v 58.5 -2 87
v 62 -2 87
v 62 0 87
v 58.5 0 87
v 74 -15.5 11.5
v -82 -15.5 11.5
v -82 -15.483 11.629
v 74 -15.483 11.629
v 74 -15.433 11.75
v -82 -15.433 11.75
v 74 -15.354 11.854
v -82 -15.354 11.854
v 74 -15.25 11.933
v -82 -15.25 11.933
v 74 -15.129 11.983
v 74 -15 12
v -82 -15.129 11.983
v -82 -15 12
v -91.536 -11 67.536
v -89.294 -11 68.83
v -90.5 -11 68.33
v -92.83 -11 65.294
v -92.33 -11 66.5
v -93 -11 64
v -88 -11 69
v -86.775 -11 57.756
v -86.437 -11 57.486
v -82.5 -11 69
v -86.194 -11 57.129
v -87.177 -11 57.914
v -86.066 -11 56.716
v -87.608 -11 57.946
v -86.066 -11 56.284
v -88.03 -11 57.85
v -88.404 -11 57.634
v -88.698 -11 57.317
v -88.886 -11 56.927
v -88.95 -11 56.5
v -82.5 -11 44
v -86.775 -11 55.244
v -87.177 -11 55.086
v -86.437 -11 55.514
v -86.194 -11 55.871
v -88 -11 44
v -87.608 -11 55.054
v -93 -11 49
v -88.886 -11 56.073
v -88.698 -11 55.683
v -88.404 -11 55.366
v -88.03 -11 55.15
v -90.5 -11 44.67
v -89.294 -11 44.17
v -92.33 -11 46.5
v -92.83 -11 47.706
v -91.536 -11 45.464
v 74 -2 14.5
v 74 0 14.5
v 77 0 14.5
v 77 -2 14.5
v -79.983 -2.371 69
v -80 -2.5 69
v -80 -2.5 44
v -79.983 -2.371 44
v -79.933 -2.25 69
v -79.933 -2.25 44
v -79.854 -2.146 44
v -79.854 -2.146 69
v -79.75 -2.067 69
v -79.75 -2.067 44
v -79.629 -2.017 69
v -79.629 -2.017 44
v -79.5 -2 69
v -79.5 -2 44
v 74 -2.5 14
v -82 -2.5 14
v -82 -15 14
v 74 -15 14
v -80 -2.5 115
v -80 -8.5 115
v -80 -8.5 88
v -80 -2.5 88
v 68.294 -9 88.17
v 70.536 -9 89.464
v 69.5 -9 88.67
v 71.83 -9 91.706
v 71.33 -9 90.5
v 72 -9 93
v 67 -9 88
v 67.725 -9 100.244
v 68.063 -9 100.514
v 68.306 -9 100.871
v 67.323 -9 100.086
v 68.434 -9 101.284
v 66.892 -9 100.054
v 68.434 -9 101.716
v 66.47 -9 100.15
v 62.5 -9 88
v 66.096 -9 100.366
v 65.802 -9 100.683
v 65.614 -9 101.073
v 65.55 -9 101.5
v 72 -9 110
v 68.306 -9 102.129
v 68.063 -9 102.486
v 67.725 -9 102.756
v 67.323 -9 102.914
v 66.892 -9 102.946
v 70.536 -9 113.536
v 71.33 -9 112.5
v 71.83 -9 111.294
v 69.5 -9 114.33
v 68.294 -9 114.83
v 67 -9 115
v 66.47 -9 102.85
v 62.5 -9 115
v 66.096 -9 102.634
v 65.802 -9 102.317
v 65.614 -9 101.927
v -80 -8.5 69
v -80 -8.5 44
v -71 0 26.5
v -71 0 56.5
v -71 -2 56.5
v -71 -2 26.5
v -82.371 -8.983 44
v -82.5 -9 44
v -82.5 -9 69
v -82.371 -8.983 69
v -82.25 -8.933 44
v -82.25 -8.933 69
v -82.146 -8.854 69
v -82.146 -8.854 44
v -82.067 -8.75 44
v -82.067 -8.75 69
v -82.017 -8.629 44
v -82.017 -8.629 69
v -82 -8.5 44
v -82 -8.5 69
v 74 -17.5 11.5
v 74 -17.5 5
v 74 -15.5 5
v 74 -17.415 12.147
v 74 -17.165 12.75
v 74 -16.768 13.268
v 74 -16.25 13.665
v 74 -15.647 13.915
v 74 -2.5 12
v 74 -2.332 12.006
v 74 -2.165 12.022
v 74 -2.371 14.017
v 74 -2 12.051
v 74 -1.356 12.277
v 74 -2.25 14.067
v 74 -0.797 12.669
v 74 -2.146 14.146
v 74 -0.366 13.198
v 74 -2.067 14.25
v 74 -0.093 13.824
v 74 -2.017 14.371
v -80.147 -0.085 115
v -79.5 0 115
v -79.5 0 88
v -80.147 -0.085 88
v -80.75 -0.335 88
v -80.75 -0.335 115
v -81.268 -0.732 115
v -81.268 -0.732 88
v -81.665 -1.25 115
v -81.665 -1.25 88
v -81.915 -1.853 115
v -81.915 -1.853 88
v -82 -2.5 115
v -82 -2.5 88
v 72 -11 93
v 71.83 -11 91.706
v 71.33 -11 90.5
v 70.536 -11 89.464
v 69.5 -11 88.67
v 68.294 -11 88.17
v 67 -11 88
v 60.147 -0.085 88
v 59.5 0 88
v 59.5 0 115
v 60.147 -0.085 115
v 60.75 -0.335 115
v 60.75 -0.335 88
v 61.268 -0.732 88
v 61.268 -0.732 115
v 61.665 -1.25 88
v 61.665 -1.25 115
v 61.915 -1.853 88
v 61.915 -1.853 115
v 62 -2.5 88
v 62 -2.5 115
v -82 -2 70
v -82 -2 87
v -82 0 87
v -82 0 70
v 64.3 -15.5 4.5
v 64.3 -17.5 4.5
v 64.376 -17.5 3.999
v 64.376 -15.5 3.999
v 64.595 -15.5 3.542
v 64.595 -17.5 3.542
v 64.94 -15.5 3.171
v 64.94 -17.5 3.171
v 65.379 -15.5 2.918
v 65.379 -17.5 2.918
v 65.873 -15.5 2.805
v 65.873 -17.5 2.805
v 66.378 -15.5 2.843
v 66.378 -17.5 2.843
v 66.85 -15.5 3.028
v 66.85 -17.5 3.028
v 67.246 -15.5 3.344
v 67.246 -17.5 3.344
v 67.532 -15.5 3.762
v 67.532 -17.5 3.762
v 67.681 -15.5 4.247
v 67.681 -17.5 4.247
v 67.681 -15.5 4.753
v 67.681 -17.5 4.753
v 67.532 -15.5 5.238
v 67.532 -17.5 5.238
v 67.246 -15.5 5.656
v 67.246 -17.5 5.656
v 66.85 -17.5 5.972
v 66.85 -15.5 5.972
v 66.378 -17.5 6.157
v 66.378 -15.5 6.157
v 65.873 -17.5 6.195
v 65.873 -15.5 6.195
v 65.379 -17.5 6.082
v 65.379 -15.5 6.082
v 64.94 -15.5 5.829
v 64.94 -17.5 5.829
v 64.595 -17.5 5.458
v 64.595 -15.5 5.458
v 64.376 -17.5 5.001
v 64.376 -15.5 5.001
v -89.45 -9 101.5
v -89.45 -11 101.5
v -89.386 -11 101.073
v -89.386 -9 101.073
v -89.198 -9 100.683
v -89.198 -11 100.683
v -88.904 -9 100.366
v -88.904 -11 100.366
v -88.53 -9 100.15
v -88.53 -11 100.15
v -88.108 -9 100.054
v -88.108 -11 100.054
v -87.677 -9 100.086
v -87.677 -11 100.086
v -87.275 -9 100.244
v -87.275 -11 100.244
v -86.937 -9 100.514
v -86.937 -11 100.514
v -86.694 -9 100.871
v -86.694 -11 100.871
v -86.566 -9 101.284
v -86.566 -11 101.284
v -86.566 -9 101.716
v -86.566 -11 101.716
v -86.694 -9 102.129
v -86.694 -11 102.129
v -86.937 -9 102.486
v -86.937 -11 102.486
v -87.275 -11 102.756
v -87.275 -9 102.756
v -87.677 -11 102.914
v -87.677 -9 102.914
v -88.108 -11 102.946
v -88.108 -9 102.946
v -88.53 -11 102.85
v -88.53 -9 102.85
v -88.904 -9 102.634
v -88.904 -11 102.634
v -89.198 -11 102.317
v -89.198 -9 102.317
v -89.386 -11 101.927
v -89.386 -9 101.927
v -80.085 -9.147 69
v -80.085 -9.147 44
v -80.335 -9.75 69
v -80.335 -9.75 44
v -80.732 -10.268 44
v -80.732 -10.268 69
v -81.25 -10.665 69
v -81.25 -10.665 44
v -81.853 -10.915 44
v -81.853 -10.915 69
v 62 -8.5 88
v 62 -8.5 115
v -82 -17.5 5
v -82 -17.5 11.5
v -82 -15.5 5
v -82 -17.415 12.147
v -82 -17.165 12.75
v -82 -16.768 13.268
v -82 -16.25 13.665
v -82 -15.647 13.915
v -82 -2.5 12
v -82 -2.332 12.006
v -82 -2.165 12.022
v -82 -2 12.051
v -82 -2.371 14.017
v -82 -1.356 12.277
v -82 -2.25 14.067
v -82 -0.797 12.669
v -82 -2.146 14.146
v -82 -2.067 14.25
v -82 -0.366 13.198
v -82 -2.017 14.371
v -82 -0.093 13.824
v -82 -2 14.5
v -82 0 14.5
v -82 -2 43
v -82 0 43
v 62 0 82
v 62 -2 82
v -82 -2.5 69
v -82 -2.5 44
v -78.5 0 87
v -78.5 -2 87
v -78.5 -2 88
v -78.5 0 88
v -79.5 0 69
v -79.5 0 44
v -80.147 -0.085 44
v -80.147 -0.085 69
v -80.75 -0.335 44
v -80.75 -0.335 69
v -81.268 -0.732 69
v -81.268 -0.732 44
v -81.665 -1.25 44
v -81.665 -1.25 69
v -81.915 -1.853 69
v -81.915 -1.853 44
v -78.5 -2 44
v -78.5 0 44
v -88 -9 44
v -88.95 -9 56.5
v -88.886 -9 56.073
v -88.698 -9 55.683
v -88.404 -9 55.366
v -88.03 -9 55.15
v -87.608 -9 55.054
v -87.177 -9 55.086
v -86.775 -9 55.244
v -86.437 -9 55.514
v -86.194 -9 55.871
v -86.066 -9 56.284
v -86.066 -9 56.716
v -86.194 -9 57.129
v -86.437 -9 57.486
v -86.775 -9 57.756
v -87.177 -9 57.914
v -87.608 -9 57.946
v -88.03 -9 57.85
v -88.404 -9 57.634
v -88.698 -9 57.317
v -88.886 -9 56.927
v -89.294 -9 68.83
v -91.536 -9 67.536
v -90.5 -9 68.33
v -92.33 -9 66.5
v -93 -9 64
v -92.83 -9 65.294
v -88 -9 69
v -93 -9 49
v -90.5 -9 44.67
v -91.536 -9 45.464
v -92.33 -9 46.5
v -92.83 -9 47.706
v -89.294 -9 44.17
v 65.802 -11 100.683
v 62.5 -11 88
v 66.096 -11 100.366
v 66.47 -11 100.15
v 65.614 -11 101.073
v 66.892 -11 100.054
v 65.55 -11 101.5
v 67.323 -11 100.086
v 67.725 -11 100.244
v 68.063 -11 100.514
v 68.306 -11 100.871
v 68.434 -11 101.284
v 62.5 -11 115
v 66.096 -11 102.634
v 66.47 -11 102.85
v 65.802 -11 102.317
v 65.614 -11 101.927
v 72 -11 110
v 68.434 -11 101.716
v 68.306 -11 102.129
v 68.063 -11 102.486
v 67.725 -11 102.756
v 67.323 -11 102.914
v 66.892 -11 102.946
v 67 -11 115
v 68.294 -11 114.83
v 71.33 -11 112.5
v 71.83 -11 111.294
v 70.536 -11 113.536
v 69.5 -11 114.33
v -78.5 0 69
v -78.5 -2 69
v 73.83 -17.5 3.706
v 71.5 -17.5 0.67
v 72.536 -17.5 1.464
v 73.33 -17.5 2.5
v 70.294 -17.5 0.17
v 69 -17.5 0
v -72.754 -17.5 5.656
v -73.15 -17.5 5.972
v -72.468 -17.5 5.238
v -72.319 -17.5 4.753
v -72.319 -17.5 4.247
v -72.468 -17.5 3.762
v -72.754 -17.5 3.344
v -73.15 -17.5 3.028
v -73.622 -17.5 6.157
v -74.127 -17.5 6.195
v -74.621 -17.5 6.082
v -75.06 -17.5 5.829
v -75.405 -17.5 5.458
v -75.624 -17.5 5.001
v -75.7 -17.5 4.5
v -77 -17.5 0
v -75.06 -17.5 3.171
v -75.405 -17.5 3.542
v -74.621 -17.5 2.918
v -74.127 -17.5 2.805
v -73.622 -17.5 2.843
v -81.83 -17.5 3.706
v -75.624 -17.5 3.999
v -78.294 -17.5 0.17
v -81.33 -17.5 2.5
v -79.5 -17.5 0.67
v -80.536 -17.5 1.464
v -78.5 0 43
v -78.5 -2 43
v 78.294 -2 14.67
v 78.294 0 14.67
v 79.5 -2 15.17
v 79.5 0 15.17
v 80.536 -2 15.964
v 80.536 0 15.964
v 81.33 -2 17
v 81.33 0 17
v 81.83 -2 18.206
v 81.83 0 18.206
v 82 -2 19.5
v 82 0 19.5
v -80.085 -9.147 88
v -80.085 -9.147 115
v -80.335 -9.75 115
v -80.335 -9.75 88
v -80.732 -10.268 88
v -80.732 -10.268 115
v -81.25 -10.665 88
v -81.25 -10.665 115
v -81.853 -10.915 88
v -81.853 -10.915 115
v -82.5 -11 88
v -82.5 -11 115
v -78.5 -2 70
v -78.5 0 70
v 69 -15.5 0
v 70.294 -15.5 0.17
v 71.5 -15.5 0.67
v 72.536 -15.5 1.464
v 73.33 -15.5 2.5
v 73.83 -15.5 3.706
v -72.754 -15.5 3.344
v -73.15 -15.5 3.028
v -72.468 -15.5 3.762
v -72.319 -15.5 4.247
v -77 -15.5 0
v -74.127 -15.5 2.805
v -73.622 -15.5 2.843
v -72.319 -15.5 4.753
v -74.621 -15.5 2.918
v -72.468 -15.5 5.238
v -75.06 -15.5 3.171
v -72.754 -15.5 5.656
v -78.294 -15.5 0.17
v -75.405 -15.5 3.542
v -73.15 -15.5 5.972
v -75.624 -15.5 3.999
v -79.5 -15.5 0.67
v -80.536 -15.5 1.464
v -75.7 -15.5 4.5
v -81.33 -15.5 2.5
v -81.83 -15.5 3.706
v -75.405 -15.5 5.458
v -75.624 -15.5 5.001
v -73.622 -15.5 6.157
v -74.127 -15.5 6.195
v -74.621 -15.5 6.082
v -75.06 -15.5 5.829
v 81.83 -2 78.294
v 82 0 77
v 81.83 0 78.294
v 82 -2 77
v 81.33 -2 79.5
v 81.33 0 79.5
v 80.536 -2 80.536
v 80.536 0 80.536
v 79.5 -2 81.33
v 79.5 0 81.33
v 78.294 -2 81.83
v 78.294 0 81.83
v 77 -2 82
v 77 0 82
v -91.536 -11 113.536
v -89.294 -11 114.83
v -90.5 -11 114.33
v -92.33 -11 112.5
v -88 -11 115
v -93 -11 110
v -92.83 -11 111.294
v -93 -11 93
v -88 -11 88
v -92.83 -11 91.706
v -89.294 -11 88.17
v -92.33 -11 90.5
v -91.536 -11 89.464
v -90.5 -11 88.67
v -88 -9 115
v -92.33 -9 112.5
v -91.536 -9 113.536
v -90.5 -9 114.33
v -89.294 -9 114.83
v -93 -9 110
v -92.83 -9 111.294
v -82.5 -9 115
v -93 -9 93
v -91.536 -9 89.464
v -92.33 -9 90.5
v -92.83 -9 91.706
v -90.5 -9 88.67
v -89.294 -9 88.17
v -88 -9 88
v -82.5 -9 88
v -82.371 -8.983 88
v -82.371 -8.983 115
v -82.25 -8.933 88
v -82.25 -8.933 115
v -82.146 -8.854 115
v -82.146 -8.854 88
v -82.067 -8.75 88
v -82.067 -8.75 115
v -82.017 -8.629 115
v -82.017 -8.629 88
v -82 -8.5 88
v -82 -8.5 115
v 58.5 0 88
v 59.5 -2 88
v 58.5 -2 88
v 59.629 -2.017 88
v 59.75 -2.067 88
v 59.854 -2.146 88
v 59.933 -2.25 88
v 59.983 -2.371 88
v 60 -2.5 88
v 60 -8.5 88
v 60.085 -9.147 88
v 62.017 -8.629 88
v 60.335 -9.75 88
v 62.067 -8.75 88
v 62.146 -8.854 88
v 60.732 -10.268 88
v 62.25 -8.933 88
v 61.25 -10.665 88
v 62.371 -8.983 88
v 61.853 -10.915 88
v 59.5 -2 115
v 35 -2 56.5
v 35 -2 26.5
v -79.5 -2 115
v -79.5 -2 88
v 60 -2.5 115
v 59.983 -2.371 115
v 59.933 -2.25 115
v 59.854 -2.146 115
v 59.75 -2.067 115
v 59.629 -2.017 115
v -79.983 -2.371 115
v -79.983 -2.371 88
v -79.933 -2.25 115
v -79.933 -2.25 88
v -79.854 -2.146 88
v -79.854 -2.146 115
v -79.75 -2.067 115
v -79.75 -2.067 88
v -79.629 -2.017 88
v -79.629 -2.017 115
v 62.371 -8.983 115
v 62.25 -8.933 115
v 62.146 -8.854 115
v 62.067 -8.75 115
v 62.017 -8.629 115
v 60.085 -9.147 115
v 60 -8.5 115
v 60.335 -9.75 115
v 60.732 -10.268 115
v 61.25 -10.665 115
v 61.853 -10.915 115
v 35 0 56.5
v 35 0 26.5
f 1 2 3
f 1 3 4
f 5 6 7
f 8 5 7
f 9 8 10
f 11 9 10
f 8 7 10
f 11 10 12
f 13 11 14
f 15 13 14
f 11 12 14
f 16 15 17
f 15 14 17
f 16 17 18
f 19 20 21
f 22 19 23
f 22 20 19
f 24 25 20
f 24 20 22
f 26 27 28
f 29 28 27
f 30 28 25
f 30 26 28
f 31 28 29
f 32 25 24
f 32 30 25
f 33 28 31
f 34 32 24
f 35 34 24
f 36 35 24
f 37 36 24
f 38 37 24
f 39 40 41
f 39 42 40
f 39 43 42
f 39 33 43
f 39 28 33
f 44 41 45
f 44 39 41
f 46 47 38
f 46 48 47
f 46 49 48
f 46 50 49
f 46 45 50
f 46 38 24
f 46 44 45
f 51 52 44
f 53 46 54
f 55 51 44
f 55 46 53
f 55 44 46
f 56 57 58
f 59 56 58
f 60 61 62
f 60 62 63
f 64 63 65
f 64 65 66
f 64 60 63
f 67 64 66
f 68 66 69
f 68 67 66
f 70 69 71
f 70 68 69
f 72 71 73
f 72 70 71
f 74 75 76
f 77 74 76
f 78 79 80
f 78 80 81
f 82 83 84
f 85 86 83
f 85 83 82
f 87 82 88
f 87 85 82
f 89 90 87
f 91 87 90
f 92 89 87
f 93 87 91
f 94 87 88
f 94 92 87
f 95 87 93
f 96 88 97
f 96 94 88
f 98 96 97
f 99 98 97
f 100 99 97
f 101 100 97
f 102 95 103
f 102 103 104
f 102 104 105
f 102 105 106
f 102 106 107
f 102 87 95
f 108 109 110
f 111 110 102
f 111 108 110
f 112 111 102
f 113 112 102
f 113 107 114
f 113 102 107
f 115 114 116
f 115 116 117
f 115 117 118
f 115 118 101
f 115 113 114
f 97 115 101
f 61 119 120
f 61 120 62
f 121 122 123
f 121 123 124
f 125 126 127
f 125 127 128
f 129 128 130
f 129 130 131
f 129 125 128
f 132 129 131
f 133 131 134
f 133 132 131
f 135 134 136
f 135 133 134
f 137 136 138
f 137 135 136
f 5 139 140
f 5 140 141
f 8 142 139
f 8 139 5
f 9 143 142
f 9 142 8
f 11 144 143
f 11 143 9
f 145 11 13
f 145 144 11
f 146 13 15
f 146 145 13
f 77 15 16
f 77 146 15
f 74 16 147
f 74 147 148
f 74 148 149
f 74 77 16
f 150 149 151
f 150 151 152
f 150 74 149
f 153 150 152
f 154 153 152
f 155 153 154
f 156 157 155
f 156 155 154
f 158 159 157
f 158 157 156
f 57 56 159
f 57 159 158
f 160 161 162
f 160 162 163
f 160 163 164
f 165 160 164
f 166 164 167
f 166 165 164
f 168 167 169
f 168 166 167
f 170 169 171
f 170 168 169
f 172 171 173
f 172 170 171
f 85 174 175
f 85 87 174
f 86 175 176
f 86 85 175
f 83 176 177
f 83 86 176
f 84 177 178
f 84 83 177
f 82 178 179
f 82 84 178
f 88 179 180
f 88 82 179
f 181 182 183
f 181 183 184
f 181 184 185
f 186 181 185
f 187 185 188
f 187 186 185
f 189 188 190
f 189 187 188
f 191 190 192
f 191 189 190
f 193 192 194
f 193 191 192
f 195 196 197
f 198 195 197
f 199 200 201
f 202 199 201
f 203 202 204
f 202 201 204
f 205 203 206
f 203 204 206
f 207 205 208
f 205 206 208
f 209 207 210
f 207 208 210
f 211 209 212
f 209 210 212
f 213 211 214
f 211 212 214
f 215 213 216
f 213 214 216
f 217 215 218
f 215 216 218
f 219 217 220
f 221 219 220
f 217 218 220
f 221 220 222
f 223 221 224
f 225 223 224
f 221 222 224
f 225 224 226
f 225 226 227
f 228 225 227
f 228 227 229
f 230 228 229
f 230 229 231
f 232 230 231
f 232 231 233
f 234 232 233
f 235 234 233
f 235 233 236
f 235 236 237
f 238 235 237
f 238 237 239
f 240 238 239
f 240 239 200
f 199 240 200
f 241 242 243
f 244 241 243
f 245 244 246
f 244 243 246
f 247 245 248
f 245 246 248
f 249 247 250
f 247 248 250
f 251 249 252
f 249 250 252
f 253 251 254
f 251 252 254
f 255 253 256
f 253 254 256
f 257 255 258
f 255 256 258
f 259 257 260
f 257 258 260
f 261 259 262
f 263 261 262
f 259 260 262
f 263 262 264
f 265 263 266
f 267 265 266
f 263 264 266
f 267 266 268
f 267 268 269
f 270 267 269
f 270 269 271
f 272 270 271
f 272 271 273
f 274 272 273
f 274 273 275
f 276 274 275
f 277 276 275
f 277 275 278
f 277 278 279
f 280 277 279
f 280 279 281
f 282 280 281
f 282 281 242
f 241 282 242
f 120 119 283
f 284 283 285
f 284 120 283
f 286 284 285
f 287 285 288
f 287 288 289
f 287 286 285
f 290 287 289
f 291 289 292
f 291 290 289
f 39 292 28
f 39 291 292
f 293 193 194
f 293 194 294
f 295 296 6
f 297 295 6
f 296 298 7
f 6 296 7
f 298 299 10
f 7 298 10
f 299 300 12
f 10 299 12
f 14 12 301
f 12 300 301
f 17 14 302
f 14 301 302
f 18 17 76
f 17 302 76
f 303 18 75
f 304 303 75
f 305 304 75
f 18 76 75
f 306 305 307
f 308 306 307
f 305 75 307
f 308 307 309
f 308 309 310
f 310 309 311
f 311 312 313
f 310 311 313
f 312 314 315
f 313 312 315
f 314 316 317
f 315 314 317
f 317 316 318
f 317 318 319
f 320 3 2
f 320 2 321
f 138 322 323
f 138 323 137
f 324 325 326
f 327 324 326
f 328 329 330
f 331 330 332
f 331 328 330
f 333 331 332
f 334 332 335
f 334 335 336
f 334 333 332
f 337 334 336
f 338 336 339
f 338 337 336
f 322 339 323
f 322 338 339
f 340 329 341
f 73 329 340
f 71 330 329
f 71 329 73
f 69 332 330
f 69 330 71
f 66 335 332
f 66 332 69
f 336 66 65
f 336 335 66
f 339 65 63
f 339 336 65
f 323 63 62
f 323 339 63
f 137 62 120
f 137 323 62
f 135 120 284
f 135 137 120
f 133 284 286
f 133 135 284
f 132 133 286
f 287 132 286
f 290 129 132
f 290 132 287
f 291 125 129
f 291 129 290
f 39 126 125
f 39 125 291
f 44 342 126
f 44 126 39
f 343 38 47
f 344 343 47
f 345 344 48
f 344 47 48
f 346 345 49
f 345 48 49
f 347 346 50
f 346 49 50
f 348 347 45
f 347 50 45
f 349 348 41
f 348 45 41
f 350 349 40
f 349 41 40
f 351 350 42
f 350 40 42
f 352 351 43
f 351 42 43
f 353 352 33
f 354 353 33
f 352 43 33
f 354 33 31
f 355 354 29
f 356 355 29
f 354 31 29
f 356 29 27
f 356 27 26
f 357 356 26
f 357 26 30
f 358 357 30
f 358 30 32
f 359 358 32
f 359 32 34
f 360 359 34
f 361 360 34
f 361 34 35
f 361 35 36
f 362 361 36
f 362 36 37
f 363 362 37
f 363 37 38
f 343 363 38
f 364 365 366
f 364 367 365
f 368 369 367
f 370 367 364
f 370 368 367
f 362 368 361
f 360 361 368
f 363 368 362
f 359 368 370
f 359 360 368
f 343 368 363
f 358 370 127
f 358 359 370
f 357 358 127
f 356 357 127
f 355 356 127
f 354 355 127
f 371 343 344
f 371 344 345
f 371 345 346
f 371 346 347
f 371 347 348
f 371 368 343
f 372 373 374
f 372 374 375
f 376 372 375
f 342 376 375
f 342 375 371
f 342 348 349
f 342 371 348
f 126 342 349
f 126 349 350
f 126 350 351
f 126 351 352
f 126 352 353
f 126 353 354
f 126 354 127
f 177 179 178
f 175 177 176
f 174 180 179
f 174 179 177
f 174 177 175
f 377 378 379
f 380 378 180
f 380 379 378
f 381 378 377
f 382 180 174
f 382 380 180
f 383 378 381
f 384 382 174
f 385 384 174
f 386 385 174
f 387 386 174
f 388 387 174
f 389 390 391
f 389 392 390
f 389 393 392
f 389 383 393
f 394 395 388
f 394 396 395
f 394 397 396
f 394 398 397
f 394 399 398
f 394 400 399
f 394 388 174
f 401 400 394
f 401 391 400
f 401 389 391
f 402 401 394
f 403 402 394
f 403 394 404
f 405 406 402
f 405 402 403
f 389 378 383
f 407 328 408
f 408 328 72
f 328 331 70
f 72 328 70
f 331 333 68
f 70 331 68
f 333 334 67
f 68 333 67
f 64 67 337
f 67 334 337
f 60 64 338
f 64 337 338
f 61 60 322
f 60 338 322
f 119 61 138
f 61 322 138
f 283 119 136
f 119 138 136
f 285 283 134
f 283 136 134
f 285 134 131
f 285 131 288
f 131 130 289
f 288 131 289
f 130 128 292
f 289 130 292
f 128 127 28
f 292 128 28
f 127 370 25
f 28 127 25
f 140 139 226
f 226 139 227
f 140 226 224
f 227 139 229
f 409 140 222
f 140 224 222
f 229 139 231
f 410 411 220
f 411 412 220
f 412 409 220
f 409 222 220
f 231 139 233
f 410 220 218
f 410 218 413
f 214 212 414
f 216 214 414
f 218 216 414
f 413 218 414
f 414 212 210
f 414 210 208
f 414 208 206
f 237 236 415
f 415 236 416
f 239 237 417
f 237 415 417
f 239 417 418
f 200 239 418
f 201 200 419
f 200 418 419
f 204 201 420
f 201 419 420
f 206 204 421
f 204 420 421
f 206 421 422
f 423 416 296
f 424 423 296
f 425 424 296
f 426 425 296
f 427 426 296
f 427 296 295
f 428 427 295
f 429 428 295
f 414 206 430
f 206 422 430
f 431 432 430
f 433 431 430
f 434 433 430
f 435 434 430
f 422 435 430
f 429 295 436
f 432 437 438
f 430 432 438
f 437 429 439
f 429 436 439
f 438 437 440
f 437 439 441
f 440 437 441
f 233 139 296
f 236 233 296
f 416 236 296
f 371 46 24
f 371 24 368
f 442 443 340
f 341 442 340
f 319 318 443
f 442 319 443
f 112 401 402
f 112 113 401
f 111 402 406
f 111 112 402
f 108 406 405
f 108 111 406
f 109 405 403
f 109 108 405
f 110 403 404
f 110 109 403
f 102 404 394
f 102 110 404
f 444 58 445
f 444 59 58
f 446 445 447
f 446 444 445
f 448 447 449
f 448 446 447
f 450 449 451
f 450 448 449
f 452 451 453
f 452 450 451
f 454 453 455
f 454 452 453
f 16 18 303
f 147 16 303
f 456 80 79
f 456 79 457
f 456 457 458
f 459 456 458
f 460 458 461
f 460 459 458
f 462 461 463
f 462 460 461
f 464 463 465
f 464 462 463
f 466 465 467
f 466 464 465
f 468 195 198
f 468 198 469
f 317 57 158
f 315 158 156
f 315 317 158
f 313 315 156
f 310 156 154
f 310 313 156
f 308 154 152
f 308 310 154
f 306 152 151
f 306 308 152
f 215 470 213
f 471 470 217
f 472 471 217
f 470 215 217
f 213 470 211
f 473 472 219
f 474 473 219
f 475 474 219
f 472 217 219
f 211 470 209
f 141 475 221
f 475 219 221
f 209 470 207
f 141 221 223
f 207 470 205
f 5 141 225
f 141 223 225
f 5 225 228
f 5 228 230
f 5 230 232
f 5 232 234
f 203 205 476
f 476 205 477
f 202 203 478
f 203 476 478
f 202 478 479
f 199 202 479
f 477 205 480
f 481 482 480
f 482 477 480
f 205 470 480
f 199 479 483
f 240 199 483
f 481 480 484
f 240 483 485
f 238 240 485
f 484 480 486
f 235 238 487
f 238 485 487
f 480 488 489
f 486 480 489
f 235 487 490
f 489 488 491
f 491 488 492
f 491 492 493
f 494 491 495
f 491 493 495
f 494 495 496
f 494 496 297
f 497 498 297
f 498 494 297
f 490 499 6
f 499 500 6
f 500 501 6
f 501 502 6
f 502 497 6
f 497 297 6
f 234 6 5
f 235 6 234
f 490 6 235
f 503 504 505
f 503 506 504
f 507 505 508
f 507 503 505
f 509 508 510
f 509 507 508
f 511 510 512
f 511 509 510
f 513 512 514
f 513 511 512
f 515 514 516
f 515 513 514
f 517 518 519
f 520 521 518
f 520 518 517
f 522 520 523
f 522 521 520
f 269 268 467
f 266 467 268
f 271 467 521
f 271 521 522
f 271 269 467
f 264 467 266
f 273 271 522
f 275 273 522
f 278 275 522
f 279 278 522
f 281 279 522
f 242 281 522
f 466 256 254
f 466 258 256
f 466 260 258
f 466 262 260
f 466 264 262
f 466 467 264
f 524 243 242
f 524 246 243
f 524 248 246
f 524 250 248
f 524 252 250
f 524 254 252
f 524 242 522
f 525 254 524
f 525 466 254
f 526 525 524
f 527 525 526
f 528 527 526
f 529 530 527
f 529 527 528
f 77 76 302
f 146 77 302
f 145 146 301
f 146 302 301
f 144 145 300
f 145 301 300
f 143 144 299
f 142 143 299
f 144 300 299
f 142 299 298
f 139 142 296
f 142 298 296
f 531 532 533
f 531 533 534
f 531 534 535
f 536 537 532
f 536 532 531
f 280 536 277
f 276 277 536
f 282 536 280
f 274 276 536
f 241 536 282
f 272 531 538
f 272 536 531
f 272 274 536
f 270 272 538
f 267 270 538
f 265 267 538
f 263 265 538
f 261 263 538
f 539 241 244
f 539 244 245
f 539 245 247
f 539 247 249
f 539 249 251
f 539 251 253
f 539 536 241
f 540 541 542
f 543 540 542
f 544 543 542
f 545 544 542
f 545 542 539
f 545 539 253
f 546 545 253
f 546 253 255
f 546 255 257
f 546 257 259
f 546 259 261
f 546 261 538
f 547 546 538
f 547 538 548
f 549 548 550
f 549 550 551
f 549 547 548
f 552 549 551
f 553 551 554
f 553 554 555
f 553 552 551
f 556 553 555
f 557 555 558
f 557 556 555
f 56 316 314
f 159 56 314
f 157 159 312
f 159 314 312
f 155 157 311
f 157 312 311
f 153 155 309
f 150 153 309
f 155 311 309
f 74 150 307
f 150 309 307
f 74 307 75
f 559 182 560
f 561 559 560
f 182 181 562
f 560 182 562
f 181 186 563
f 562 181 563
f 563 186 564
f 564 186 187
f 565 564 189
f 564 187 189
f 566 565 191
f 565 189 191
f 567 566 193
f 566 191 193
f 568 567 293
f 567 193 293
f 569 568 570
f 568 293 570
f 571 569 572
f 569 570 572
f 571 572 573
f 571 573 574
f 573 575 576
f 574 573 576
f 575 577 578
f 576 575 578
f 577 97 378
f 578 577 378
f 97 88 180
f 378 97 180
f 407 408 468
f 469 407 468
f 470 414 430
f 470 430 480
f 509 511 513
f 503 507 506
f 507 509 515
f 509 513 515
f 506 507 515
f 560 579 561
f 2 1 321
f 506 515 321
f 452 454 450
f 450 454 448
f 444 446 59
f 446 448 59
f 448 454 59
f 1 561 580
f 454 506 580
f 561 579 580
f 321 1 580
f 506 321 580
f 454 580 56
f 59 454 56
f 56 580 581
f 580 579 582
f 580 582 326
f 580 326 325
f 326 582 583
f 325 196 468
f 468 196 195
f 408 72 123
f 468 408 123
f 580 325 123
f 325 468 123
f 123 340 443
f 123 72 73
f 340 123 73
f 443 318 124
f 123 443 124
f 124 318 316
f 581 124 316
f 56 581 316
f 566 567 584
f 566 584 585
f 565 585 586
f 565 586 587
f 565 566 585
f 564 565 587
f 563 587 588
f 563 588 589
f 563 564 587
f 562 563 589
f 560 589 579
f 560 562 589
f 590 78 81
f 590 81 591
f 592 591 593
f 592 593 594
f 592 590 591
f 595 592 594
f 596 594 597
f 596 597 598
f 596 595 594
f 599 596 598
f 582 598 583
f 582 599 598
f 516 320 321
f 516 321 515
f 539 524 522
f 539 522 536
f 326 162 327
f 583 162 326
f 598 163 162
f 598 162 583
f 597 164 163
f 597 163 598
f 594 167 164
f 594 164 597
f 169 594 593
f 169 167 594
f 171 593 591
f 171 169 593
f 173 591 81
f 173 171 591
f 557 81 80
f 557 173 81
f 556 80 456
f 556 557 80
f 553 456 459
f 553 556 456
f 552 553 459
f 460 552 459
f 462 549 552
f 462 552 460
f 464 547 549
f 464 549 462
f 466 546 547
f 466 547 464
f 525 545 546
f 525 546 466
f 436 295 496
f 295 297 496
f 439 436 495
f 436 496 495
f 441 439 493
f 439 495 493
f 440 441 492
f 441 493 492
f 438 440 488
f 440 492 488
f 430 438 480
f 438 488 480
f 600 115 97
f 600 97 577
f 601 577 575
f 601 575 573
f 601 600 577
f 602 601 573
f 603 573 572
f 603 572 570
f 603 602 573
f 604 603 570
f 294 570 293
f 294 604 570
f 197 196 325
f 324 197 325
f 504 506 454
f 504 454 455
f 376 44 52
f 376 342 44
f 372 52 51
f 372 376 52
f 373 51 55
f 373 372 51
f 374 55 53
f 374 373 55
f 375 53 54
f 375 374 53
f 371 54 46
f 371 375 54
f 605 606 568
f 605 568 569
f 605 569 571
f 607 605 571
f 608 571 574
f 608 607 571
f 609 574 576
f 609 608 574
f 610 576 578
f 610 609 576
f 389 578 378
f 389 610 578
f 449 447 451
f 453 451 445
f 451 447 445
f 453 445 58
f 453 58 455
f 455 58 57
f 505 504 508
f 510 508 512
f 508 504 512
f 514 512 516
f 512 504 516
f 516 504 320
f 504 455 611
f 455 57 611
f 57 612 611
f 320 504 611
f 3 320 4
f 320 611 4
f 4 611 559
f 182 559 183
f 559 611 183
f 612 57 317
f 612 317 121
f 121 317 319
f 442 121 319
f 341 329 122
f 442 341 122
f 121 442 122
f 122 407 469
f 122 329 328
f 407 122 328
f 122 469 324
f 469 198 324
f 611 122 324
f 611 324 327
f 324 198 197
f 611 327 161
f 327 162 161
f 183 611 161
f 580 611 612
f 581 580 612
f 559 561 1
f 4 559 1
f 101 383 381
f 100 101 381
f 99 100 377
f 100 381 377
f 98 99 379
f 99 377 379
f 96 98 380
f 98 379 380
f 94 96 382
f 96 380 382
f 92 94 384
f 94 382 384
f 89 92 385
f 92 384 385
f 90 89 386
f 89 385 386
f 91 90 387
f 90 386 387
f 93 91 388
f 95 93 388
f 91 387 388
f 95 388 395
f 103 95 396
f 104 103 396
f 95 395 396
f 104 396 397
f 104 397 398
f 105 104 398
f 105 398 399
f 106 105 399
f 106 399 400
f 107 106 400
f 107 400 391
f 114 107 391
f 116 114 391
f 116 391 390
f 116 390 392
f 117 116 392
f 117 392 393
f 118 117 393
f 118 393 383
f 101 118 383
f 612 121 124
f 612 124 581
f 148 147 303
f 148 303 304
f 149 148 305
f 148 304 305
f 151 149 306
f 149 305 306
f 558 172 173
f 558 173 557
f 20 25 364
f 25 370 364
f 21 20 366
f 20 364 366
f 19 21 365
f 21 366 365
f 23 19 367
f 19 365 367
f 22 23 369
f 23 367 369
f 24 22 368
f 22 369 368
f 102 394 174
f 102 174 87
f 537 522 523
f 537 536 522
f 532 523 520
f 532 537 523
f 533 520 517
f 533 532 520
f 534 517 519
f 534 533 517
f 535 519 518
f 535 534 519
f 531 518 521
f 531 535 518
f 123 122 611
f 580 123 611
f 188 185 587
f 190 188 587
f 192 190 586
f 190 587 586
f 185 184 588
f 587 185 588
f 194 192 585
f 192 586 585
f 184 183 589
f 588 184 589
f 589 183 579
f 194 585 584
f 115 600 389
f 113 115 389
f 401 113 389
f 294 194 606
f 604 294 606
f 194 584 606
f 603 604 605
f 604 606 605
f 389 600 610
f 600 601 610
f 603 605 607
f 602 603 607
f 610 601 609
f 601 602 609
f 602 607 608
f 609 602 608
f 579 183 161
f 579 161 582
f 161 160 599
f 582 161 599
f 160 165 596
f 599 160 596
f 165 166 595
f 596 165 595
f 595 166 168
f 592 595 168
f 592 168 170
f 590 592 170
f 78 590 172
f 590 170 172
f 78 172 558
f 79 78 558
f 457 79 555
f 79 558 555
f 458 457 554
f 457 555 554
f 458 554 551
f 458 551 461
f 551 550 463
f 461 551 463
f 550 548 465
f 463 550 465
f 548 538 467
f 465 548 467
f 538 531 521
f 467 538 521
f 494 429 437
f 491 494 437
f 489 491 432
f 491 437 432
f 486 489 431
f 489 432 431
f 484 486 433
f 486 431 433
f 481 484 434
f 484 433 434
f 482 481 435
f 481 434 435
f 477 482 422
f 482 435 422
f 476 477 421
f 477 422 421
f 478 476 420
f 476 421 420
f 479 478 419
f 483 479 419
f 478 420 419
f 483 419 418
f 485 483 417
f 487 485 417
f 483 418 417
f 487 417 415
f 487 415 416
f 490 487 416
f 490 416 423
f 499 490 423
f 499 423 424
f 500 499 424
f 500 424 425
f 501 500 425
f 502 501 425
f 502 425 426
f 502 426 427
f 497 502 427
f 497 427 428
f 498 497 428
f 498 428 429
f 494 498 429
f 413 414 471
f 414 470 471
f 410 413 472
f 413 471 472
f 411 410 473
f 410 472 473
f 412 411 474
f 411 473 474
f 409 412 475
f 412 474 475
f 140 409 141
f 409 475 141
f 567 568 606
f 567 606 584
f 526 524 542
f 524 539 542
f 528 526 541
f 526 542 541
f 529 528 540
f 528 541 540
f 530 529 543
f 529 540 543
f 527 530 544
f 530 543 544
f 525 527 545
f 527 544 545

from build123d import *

# Parameters (mm, degrees)
SKETCH_2_W                        = 164
SKETCH_2_H                        = 2
SM_BASE_FLANGE_1_DEPTH            = 115
OTHER_START                       = -82
OTHER_1_DEPTH                     = 164
OTHER_1_2_DEPTH                   = 164
OTHER_1_3_DEPTH                   = 164
OTHER_1_3_2_DEPTH                 = 164
CUT_EXTRUDE_2_REACH               = 143.255
SKETCH_10_W                       = 8
SKETCH_10_H                       = 28.71238898
OTHER_1_4_DEPTH                   = 156
OTHER_1_4_2_DEPTH                 = 156
CUT_EXTRUDE_5_REACH               = 144.321
SKETCH_17_W                       = 20
SKETCH_17_H                       = 33
SM_EDGE_FLANGE_2_STRIP_W          = 9
SM_EDGE_FLANGE_2_STRIP_H          = 2
SM_EDGE_FLANGE_2_STRIP_CUT_DEPTH  = 27
SM_EDGE_FLANGE_2_RELIEF_W         = 10
SM_EDGE_FLANGE_2_RELIEF_H         = 1
SM_EDGE_FLANGE_2_RELIEF_CUT_DEPTH = 2
SM_EDGE_FLANGE_2_DEPTH            = 27
SM_EDGE_FLANGE_4_STRIP_W          = 9
SM_EDGE_FLANGE_4_STRIP_H          = 2
SM_EDGE_FLANGE_4_STRIP_CUT_DEPTH  = 27
SM_EDGE_FLANGE_4_DEPTH            = 27
SM_EDGE_FLANGE_6_STRIP_W          = 9
SM_EDGE_FLANGE_6_STRIP_H          = 2
SM_EDGE_FLANGE_6_STRIP_CUT_DEPTH  = 25
SM_EDGE_FLANGE_6_RELIEF_W         = 10
SM_EDGE_FLANGE_6_RELIEF_H         = 1
SM_EDGE_FLANGE_6_RELIEF_CUT_DEPTH = 2
SM_EDGE_FLANGE_6_DEPTH            = 25
SM_EDGE_FLANGE_8_STRIP_W          = 9
SM_EDGE_FLANGE_8_STRIP_H          = 2
SM_EDGE_FLANGE_8_STRIP_CUT_DEPTH  = 25
SM_EDGE_FLANGE_8_DEPTH            = 25
SM_EDGE_FLANGE_9_STRIP_W          = 9
SM_EDGE_FLANGE_9_STRIP_H          = 2
SM_EDGE_FLANGE_9_STRIP_CUT_DEPTH  = 27
SM_EDGE_FLANGE_9_RELIEF_W         = 10
SM_EDGE_FLANGE_9_RELIEF_H         = 1
SM_EDGE_FLANGE_9_RELIEF_CUT_DEPTH = 2
SM_EDGE_FLANGE_9_DEPTH            = 27
SM_EDGE_FLANGE_10_STRIP_W         = 9
SM_EDGE_FLANGE_10_STRIP_H         = 2
SM_EDGE_FLANGE_10_STRIP_CUT_DEPTH = 27
SM_EDGE_FLANGE_10_DEPTH           = 27
CUT_EXTRUDE_6_REACH               = 150.93
SKETCH_45_W                       = 106
SKETCH_45_H                       = 30
FILLET_1_R                        = 5
HOLE_WIZARD_M3_1_D                = 3.4
HOLE_WIZARD_M2_5_1_D              = 2.9


# Read off the part's stored shape, not the designer's step: ｼﾞｮｸﾞ1, ｱﾝﾌｫｰﾙﾄﾞ1, ﾌｫｰﾙﾄﾞ1
# Sheet-metal steps are written as plain solids
with BuildPart() as part:
    # Sketch 2 → ﾍﾞｰｽ-ﾌﾗﾝｼﾞ1 (new body)
    with BuildSketch(Plane.XY):
        with Locations((0, -1)):
            Rectangle(SKETCH_2_W, SKETCH_2_H)
    extrude(amount=SM_BASE_FLANGE_1_DEPTH)

    # Other 1 outline → Other 1 (cut)
    with BuildSketch(Plane.YZ.offset(OTHER_START)):
        with BuildLine():
            ThreePointArc((0, 14.5), (-0.563508327, 12.91886117), (-2, 12.050510257))
            Line((-2, 12.050510257), (-2, 0))
            Line((-2, 0), (0, 0))
            Line((0, 0), (0, 14.5))
        make_face()
    extrude(amount=OTHER_1_DEPTH, mode=Mode.SUBTRACT)

    # Other 1 2 outline → Other 1 2 (add)
    with BuildSketch(Plane.YZ.offset(OTHER_START)):
        with BuildLine():
            ThreePointArc((-15.5, 11.5), (-15.353553391, 11.853553391), (-15, 12))
            Line((-15, 12), (-2.5, 12))
            ThreePointArc((-2.5, 12), (-2.248727595, 12.012659617), (-2, 12.050510257))
            Line((-2, 12.050510257), (-2, 14.5))
            ThreePointArc((-2, 14.5), (-2.146446609, 14.146446609), (-2.5, 14))
            Line((-2.5, 14), (-15, 14))
            ThreePointArc((-15, 14), (-16.767766953, 13.267766953), (-17.5, 11.5))
            Line((-17.5, 11.5), (-17.5, 0))
            Line((-17.5, 0), (-15.5, 0))
            Line((-15.5, 0), (-15.5, 11.5))
        make_face()
    extrude(amount=OTHER_1_2_DEPTH)

    # Other 1 3 outline → Other 1 3 (cut)
    with BuildSketch(Plane.YZ.offset(OTHER_START)):
        with BuildLine():
            ThreePointArc((-2.5, 12), (-2.248727595, 12.012659617), (-2, 12.050510257))
            Line((-2, 12.050510257), (-2, 14.5))
            ThreePointArc((-2, 14.5), (-2.146446609, 14.146446609), (-2.5, 14))
            Line((-2.5, 14), (-15, 14))
            ThreePointArc((-15, 14), (-16.767766953, 13.267766953), (-17.5, 11.5))
            Line((-17.5, 11.5), (-17.5, 0))
            Line((-17.5, 0), (-15.5, 0))
            Line((-15.5, 0), (-15.5, 11.5))
            ThreePointArc((-15.5, 11.5), (-15.353553391, 11.853553391), (-15, 12))
            Line((-15, 12), (-2.5, 12))
        make_face()
    extrude(amount=OTHER_1_3_DEPTH, mode=Mode.SUBTRACT)

    # Other 1 3 2 outline → Other 1 3 2 (add)
    with BuildSketch(Plane.YZ.offset(OTHER_START)):
        with BuildLine():
            Line((0, -14.21238898), (0, 14.5))
            ThreePointArc((0, 14.5), (-0.563508327, 12.91886117), (-2, 12.050510257))
            Line((-2, 12.050510257), (-2, -14.21238898))
            Line((-2, -14.21238898), (0, -14.21238898))
        make_face()
    extrude(amount=OTHER_1_3_2_DEPTH)

    # ｽｹｯﾁ10 → ｶｯﾄ - 押し出し2 (cut, up to next)
    with BuildSketch(Plane(origin=(0, 0, 0), x_dir=(1, 0, 0), z_dir=(0, 1, 0)), mode=Mode.PRIVATE) as cut_extrude_2_sk1:
        with Locations((78, -0.14380551)):
            Rectangle(SKETCH_10_W, SKETCH_10_H)
    cut_extrude_2_tool1 = extrude(cut_extrude_2_sk1.sketch, amount=-CUT_EXTRUDE_2_REACH, mode=Mode.PRIVATE) & part.part
    add(cut_extrude_2_tool1.solids().sort_by_distance((78, 0, 0.143806))[0], mode=Mode.SUBTRACT)

    # Other 1 4 outline → Other 1 4 (cut)
    with BuildSketch(Plane.YZ.offset(OTHER_START)):
        with BuildLine():
            ThreePointArc((0, 14.5), (-0.563508327, 12.91886117), (-2, 12.050510257))
            Line((-2, 12.050510257), (-2, -14.21238898))
            Line((-2, -14.21238898), (0, -14.21238898))
            Line((0, -14.21238898), (0, 14.5))
        make_face()
    extrude(amount=OTHER_1_4_DEPTH, mode=Mode.SUBTRACT)

    # Other 1 4 2 outline → Other 1 4 2 (add)
    with BuildSketch(Plane.YZ.offset(OTHER_START)):
        with BuildLine():
            ThreePointArc((-15.5, 11.5), (-15.353553391, 11.853553391), (-15, 12))
            Line((-15, 12), (-2.5, 12))
            ThreePointArc((-2.5, 12), (-2.248727595, 12.012659617), (-2, 12.050510257))
            Line((-2, 12.050510257), (-2, 14.5))
            ThreePointArc((-2, 14.5), (-2.146446609, 14.146446609), (-2.5, 14))
            Line((-2.5, 14), (-15, 14))
            ThreePointArc((-15, 14), (-16.767766953, 13.267766953), (-17.5, 11.5))
            Line((-17.5, 11.5), (-17.5, 0))
            Line((-17.5, 0), (-15.5, 0))
            Line((-15.5, 0), (-15.5, 11.5))
        make_face()
    extrude(amount=OTHER_1_4_2_DEPTH)

    # ｽｹｯﾁ17 → ｶｯﾄ - 押し出し5 (cut, up to next)
    with BuildSketch(Plane(origin=(0, 0, 0), x_dir=(1, 0, 0), z_dir=(0, 1, 0)), mode=Mode.PRIVATE) as cut_extrude_5_sk1:
        with Locations((72, -98.5)):
            Rectangle(SKETCH_17_W, SKETCH_17_H)
    cut_extrude_5_tool1 = extrude(cut_extrude_5_sk1.sketch, amount=-CUT_EXTRUDE_5_REACH, mode=Mode.PRIVATE) & part.part
    add(cut_extrude_5_tool1.solids().sort_by_distance((72, 0, 98.5))[0], mode=Mode.SUBTRACT)

    # ｴｯｼﾞ-ﾌﾗﾝｼﾞ2 strip (across the edge) → ｴｯｼﾞ-ﾌﾗﾝｼﾞ2 strip cut (cut)
    with BuildSketch(Plane(origin=(62, -2, 88), x_dir=(-1, 0, 0), z_dir=(0, 0, 1))):
        with Locations((-2, -1)):
            Rectangle(SM_EDGE_FLANGE_2_STRIP_W, SM_EDGE_FLANGE_2_STRIP_H)
    extrude(amount=SM_EDGE_FLANGE_2_STRIP_CUT_DEPTH, mode=Mode.SUBTRACT)

    # ｴｯｼﾞ-ﾌﾗﾝｼﾞ2 relief (on the sheet) → ｴｯｼﾞ-ﾌﾗﾝｼﾞ2 relief cut (cut)
    with BuildSketch(Plane(origin=(59.5, -2, 88), x_dir=(-1, 0, 0), z_dir=(0, -1, 0))):
        with Locations((-4, 0.5)):
            Rectangle(SM_EDGE_FLANGE_2_RELIEF_W, SM_EDGE_FLANGE_2_RELIEF_H)
    extrude(amount=-SM_EDGE_FLANGE_2_RELIEF_CUT_DEPTH, mode=Mode.SUBTRACT)

    # ｴｯｼﾞ-ﾌﾗﾝｼﾞ2 section (across the edge) → ｴｯｼﾞ-ﾌﾗﾝｼﾞ2 (add)
    with BuildSketch(Plane(origin=(62, -2, 88), x_dir=(-1, 0, 0), z_dir=(0, 0, 1))):
        with BuildLine():
            Line((0, 0.5), (0, 9))
            Line((0, 9), (2, 9))
            Line((2, 9), (2, 0.5))
            ThreePointArc((2, 0.5), (2.146446609, 0.146446609), (2.5, 0))
            Line((2.5, 0), (2.5, -2))
            ThreePointArc((2.5, -2), (0.732233047, -1.267766953), (0, 0.5))
        make_face()
    extrude(amount=SM_EDGE_FLANGE_2_DEPTH)

    # ｴｯｼﾞ-ﾌﾗﾝｼﾞ4 strip (across the edge) → ｴｯｼﾞ-ﾌﾗﾝｼﾞ4 strip cut (cut)
    with BuildSketch(Plane(origin=(62, -11, 115), x_dir=(0, 1, 0), z_dir=(0, 0, -1))):
        with Locations((-2, -1)):
            Rectangle(SM_EDGE_FLANGE_4_STRIP_W, SM_EDGE_FLANGE_4_STRIP_H)
    extrude(amount=SM_EDGE_FLANGE_4_STRIP_CUT_DEPTH, mode=Mode.SUBTRACT)

    # ｴｯｼﾞ-ﾌﾗﾝｼﾞ4 section (across the edge) → ｴｯｼﾞ-ﾌﾗﾝｼﾞ4 (add)
    with BuildSketch(Plane(origin=(62, -11, 115), x_dir=(0, 1, 0), z_dir=(0, 0, -1))):
        with BuildLine():
            Line((0, 0.5), (0, 10))
            Line((0, 10), (2, 10))
            Line((2, 10), (2, 0.5))
            ThreePointArc((2, 0.5), (2.146446609, 0.146446609), (2.5, 0))
            Line((2.5, 0), (2.5, -2))
            ThreePointArc((2.5, -2), (0.732233047, -1.267766953), (0, 0.5))
        make_face()
    extrude(amount=SM_EDGE_FLANGE_4_DEPTH)

    # ｴｯｼﾞ-ﾌﾗﾝｼﾞ6 strip (across the edge) → ｴｯｼﾞ-ﾌﾗﾝｼﾞ6 strip cut (cut)
    with BuildSketch(Plane(origin=(-82, -2, 69), x_dir=(1, 0, 0), z_dir=(0, 0, -1))):
        with Locations((-2, -1)):
            Rectangle(SM_EDGE_FLANGE_6_STRIP_W, SM_EDGE_FLANGE_6_STRIP_H)
    extrude(amount=SM_EDGE_FLANGE_6_STRIP_CUT_DEPTH, mode=Mode.SUBTRACT)

    # ｴｯｼﾞ-ﾌﾗﾝｼﾞ6 relief (on the sheet) → ｴｯｼﾞ-ﾌﾗﾝｼﾞ6 relief cut (cut)
    with BuildSketch(Plane(origin=(-79.5, -2, 69), x_dir=(1, 0, 0), z_dir=(0, -1, 0))):
        with Locations((-4, 0.5)):
            Rectangle(SM_EDGE_FLANGE_6_RELIEF_W, SM_EDGE_FLANGE_6_RELIEF_H)
        with Locations((-4, -25.5)):
            Rectangle(SM_EDGE_FLANGE_6_RELIEF_W, SM_EDGE_FLANGE_6_RELIEF_H)
    extrude(amount=-SM_EDGE_FLANGE_6_RELIEF_CUT_DEPTH, mode=Mode.SUBTRACT)

    # ｴｯｼﾞ-ﾌﾗﾝｼﾞ6 section (across the edge) → ｴｯｼﾞ-ﾌﾗﾝｼﾞ6 (add)
    with BuildSketch(Plane(origin=(-82, -2, 69), x_dir=(1, 0, 0), z_dir=(0, 0, -1))):
        with BuildLine():
            Line((0, 0.5), (0, 9))
            Line((0, 9), (2, 9))
            Line((2, 9), (2, 0.5))
            ThreePointArc((2, 0.5), (2.146446609, 0.146446609), (2.5, 0))
            Line((2.5, 0), (2.5, -2))
            ThreePointArc((2.5, -2), (0.732233047, -1.267766953), (0, 0.5))
        make_face()
    extrude(amount=SM_EDGE_FLANGE_6_DEPTH)

    # ｴｯｼﾞ-ﾌﾗﾝｼﾞ8 strip (across the edge) → ｴｯｼﾞ-ﾌﾗﾝｼﾞ8 strip cut (cut)
    with BuildSketch(Plane(origin=(-82, -11, 44), x_dir=(0, 1, 0), z_dir=(0, 0, 1))):
        with Locations((-2, -1)):
            Rectangle(SM_EDGE_FLANGE_8_STRIP_W, SM_EDGE_FLANGE_8_STRIP_H)
    extrude(amount=SM_EDGE_FLANGE_8_STRIP_CUT_DEPTH, mode=Mode.SUBTRACT)

    # ｴｯｼﾞ-ﾌﾗﾝｼﾞ8 section (across the edge) → ｴｯｼﾞ-ﾌﾗﾝｼﾞ8 (add)
    with BuildSketch(Plane(origin=(-82, -11, 44), x_dir=(0, 1, 0), z_dir=(0, 0, 1))):
        with BuildLine():
            Line((0, 0.5), (0, 11))
            Line((0, 11), (2, 11))
            Line((2, 11), (2, 0.5))
            ThreePointArc((2, 0.5), (2.146446609, 0.146446609), (2.5, 0))
            Line((2.5, 0), (2.5, -2))
            ThreePointArc((2.5, -2), (0.732233047, -1.267766953), (0, 0.5))
        make_face()
    extrude(amount=SM_EDGE_FLANGE_8_DEPTH)

    # ｴｯｼﾞ-ﾌﾗﾝｼﾞ9 strip (across the edge) → ｴｯｼﾞ-ﾌﾗﾝｼﾞ9 strip cut (cut)
    with BuildSketch(Plane(origin=(-82, -2, 115), x_dir=(1, 0, 0), z_dir=(0, 0, -1))):
        with Locations((-2, -1)):
            Rectangle(SM_EDGE_FLANGE_9_STRIP_W, SM_EDGE_FLANGE_9_STRIP_H)
    extrude(amount=SM_EDGE_FLANGE_9_STRIP_CUT_DEPTH, mode=Mode.SUBTRACT)

    # ｴｯｼﾞ-ﾌﾗﾝｼﾞ9 relief (on the sheet) → ｴｯｼﾞ-ﾌﾗﾝｼﾞ9 relief cut (cut)
    with BuildSketch(Plane(origin=(-79.5, -2, 115), x_dir=(1, 0, 0), z_dir=(0, -1, 0))):
        with Locations((-4, -27.5)):
            Rectangle(SM_EDGE_FLANGE_9_RELIEF_W, SM_EDGE_FLANGE_9_RELIEF_H)
    extrude(amount=-SM_EDGE_FLANGE_9_RELIEF_CUT_DEPTH, mode=Mode.SUBTRACT)

    # ｴｯｼﾞ-ﾌﾗﾝｼﾞ9 section (across the edge) → ｴｯｼﾞ-ﾌﾗﾝｼﾞ9 (add)
    with BuildSketch(Plane(origin=(-82, -2, 115), x_dir=(1, 0, 0), z_dir=(0, 0, -1))):
        with BuildLine():
            Line((0, 0.5), (0, 9))
            Line((0, 9), (2, 9))
            Line((2, 9), (2, 0.5))
            ThreePointArc((2, 0.5), (2.146446609, 0.146446609), (2.5, 0))
            Line((2.5, 0), (2.5, -2))
            ThreePointArc((2.5, -2), (0.732233047, -1.267766953), (0, 0.5))
        make_face()
    extrude(amount=SM_EDGE_FLANGE_9_DEPTH)

    # ｴｯｼﾞ-ﾌﾗﾝｼﾞ10 strip (across the edge) → ｴｯｼﾞ-ﾌﾗﾝｼﾞ10 strip cut (cut)
    with BuildSketch(Plane(origin=(-82, -11, 88), x_dir=(0, 1, 0), z_dir=(0, 0, 1))):
        with Locations((-2, -1)):
            Rectangle(SM_EDGE_FLANGE_10_STRIP_W, SM_EDGE_FLANGE_10_STRIP_H)
    extrude(amount=SM_EDGE_FLANGE_10_STRIP_CUT_DEPTH, mode=Mode.SUBTRACT)

    # ｴｯｼﾞ-ﾌﾗﾝｼﾞ10 section (across the edge) → ｴｯｼﾞ-ﾌﾗﾝｼﾞ10 (add)
    with BuildSketch(Plane(origin=(-82, -11, 88), x_dir=(0, 1, 0), z_dir=(0, 0, 1))):
        with BuildLine():
            Line((0, 0.5), (0, 11))
            Line((0, 11), (2, 11))
            Line((2, 11), (2, 0.5))
            ThreePointArc((2, 0.5), (2.146446609, 0.146446609), (2.5, 0))
            Line((2.5, 0), (2.5, -2))
            ThreePointArc((2.5, -2), (0.732233047, -1.267766953), (0, 0.5))
        make_face()
    extrude(amount=SM_EDGE_FLANGE_10_DEPTH)

    # ｽｹｯﾁ45 → ｶｯﾄ - 押し出し6 (cut, up to next)
    with BuildSketch(Plane(origin=(0, 0, 0), x_dir=(1, 0, 0), z_dir=(0, 1, 0)), mode=Mode.PRIVATE) as cut_extrude_6_sk1:
        with Locations((-18, -41.5)):
            Rectangle(SKETCH_45_W, SKETCH_45_H)
    cut_extrude_6_tool1 = extrude(cut_extrude_6_sk1.sketch, amount=-CUT_EXTRUDE_6_REACH, mode=Mode.PRIVATE) & part.part
    add(cut_extrude_6_tool1.solids().sort_by_distance((-18, 0, 41.5))[0], mode=Mode.SUBTRACT)

    # ﾌｨﾚｯﾄ1
    fillet_1_edges = [part.edges().sort_by_distance(p)[0] for p in [
        (-82, -16.5, 0),
        (74, -16.5, 0),
        (82, -1, 14.5),
        (82, -1, 82),
        (72, -10, 115),
        (72, -10, 88),
        (-93, -10, 44),
        (-93, -10, 69),
        (-93, -10, 88),
        (-93, -10, 115),
    ]]
    fillet(fillet_1_edges, radius=FILLET_1_R)

    # M3 すきま穴1 (through all)
    with Locations(Plane(origin=(0, -15.5, 0), x_dir=(1, 0, 0), z_dir=(0, 1, 0))):
        with Locations((66, -4.5), (-74, -4.5)):
            Hole(HOLE_WIZARD_M3_1_D / 2)

    # M2.5 すきま穴1 (through all)
    with Locations(Plane(origin=(0, -9, 0), x_dir=(1, 0, 0), z_dir=(0, 1, 0))):
        with Locations((-88, -101.5), (67, -101.5), (-87.5, -56.5)):
            Hole(HOLE_WIZARD_M2_5_1_D / 2)


solid = part.part
